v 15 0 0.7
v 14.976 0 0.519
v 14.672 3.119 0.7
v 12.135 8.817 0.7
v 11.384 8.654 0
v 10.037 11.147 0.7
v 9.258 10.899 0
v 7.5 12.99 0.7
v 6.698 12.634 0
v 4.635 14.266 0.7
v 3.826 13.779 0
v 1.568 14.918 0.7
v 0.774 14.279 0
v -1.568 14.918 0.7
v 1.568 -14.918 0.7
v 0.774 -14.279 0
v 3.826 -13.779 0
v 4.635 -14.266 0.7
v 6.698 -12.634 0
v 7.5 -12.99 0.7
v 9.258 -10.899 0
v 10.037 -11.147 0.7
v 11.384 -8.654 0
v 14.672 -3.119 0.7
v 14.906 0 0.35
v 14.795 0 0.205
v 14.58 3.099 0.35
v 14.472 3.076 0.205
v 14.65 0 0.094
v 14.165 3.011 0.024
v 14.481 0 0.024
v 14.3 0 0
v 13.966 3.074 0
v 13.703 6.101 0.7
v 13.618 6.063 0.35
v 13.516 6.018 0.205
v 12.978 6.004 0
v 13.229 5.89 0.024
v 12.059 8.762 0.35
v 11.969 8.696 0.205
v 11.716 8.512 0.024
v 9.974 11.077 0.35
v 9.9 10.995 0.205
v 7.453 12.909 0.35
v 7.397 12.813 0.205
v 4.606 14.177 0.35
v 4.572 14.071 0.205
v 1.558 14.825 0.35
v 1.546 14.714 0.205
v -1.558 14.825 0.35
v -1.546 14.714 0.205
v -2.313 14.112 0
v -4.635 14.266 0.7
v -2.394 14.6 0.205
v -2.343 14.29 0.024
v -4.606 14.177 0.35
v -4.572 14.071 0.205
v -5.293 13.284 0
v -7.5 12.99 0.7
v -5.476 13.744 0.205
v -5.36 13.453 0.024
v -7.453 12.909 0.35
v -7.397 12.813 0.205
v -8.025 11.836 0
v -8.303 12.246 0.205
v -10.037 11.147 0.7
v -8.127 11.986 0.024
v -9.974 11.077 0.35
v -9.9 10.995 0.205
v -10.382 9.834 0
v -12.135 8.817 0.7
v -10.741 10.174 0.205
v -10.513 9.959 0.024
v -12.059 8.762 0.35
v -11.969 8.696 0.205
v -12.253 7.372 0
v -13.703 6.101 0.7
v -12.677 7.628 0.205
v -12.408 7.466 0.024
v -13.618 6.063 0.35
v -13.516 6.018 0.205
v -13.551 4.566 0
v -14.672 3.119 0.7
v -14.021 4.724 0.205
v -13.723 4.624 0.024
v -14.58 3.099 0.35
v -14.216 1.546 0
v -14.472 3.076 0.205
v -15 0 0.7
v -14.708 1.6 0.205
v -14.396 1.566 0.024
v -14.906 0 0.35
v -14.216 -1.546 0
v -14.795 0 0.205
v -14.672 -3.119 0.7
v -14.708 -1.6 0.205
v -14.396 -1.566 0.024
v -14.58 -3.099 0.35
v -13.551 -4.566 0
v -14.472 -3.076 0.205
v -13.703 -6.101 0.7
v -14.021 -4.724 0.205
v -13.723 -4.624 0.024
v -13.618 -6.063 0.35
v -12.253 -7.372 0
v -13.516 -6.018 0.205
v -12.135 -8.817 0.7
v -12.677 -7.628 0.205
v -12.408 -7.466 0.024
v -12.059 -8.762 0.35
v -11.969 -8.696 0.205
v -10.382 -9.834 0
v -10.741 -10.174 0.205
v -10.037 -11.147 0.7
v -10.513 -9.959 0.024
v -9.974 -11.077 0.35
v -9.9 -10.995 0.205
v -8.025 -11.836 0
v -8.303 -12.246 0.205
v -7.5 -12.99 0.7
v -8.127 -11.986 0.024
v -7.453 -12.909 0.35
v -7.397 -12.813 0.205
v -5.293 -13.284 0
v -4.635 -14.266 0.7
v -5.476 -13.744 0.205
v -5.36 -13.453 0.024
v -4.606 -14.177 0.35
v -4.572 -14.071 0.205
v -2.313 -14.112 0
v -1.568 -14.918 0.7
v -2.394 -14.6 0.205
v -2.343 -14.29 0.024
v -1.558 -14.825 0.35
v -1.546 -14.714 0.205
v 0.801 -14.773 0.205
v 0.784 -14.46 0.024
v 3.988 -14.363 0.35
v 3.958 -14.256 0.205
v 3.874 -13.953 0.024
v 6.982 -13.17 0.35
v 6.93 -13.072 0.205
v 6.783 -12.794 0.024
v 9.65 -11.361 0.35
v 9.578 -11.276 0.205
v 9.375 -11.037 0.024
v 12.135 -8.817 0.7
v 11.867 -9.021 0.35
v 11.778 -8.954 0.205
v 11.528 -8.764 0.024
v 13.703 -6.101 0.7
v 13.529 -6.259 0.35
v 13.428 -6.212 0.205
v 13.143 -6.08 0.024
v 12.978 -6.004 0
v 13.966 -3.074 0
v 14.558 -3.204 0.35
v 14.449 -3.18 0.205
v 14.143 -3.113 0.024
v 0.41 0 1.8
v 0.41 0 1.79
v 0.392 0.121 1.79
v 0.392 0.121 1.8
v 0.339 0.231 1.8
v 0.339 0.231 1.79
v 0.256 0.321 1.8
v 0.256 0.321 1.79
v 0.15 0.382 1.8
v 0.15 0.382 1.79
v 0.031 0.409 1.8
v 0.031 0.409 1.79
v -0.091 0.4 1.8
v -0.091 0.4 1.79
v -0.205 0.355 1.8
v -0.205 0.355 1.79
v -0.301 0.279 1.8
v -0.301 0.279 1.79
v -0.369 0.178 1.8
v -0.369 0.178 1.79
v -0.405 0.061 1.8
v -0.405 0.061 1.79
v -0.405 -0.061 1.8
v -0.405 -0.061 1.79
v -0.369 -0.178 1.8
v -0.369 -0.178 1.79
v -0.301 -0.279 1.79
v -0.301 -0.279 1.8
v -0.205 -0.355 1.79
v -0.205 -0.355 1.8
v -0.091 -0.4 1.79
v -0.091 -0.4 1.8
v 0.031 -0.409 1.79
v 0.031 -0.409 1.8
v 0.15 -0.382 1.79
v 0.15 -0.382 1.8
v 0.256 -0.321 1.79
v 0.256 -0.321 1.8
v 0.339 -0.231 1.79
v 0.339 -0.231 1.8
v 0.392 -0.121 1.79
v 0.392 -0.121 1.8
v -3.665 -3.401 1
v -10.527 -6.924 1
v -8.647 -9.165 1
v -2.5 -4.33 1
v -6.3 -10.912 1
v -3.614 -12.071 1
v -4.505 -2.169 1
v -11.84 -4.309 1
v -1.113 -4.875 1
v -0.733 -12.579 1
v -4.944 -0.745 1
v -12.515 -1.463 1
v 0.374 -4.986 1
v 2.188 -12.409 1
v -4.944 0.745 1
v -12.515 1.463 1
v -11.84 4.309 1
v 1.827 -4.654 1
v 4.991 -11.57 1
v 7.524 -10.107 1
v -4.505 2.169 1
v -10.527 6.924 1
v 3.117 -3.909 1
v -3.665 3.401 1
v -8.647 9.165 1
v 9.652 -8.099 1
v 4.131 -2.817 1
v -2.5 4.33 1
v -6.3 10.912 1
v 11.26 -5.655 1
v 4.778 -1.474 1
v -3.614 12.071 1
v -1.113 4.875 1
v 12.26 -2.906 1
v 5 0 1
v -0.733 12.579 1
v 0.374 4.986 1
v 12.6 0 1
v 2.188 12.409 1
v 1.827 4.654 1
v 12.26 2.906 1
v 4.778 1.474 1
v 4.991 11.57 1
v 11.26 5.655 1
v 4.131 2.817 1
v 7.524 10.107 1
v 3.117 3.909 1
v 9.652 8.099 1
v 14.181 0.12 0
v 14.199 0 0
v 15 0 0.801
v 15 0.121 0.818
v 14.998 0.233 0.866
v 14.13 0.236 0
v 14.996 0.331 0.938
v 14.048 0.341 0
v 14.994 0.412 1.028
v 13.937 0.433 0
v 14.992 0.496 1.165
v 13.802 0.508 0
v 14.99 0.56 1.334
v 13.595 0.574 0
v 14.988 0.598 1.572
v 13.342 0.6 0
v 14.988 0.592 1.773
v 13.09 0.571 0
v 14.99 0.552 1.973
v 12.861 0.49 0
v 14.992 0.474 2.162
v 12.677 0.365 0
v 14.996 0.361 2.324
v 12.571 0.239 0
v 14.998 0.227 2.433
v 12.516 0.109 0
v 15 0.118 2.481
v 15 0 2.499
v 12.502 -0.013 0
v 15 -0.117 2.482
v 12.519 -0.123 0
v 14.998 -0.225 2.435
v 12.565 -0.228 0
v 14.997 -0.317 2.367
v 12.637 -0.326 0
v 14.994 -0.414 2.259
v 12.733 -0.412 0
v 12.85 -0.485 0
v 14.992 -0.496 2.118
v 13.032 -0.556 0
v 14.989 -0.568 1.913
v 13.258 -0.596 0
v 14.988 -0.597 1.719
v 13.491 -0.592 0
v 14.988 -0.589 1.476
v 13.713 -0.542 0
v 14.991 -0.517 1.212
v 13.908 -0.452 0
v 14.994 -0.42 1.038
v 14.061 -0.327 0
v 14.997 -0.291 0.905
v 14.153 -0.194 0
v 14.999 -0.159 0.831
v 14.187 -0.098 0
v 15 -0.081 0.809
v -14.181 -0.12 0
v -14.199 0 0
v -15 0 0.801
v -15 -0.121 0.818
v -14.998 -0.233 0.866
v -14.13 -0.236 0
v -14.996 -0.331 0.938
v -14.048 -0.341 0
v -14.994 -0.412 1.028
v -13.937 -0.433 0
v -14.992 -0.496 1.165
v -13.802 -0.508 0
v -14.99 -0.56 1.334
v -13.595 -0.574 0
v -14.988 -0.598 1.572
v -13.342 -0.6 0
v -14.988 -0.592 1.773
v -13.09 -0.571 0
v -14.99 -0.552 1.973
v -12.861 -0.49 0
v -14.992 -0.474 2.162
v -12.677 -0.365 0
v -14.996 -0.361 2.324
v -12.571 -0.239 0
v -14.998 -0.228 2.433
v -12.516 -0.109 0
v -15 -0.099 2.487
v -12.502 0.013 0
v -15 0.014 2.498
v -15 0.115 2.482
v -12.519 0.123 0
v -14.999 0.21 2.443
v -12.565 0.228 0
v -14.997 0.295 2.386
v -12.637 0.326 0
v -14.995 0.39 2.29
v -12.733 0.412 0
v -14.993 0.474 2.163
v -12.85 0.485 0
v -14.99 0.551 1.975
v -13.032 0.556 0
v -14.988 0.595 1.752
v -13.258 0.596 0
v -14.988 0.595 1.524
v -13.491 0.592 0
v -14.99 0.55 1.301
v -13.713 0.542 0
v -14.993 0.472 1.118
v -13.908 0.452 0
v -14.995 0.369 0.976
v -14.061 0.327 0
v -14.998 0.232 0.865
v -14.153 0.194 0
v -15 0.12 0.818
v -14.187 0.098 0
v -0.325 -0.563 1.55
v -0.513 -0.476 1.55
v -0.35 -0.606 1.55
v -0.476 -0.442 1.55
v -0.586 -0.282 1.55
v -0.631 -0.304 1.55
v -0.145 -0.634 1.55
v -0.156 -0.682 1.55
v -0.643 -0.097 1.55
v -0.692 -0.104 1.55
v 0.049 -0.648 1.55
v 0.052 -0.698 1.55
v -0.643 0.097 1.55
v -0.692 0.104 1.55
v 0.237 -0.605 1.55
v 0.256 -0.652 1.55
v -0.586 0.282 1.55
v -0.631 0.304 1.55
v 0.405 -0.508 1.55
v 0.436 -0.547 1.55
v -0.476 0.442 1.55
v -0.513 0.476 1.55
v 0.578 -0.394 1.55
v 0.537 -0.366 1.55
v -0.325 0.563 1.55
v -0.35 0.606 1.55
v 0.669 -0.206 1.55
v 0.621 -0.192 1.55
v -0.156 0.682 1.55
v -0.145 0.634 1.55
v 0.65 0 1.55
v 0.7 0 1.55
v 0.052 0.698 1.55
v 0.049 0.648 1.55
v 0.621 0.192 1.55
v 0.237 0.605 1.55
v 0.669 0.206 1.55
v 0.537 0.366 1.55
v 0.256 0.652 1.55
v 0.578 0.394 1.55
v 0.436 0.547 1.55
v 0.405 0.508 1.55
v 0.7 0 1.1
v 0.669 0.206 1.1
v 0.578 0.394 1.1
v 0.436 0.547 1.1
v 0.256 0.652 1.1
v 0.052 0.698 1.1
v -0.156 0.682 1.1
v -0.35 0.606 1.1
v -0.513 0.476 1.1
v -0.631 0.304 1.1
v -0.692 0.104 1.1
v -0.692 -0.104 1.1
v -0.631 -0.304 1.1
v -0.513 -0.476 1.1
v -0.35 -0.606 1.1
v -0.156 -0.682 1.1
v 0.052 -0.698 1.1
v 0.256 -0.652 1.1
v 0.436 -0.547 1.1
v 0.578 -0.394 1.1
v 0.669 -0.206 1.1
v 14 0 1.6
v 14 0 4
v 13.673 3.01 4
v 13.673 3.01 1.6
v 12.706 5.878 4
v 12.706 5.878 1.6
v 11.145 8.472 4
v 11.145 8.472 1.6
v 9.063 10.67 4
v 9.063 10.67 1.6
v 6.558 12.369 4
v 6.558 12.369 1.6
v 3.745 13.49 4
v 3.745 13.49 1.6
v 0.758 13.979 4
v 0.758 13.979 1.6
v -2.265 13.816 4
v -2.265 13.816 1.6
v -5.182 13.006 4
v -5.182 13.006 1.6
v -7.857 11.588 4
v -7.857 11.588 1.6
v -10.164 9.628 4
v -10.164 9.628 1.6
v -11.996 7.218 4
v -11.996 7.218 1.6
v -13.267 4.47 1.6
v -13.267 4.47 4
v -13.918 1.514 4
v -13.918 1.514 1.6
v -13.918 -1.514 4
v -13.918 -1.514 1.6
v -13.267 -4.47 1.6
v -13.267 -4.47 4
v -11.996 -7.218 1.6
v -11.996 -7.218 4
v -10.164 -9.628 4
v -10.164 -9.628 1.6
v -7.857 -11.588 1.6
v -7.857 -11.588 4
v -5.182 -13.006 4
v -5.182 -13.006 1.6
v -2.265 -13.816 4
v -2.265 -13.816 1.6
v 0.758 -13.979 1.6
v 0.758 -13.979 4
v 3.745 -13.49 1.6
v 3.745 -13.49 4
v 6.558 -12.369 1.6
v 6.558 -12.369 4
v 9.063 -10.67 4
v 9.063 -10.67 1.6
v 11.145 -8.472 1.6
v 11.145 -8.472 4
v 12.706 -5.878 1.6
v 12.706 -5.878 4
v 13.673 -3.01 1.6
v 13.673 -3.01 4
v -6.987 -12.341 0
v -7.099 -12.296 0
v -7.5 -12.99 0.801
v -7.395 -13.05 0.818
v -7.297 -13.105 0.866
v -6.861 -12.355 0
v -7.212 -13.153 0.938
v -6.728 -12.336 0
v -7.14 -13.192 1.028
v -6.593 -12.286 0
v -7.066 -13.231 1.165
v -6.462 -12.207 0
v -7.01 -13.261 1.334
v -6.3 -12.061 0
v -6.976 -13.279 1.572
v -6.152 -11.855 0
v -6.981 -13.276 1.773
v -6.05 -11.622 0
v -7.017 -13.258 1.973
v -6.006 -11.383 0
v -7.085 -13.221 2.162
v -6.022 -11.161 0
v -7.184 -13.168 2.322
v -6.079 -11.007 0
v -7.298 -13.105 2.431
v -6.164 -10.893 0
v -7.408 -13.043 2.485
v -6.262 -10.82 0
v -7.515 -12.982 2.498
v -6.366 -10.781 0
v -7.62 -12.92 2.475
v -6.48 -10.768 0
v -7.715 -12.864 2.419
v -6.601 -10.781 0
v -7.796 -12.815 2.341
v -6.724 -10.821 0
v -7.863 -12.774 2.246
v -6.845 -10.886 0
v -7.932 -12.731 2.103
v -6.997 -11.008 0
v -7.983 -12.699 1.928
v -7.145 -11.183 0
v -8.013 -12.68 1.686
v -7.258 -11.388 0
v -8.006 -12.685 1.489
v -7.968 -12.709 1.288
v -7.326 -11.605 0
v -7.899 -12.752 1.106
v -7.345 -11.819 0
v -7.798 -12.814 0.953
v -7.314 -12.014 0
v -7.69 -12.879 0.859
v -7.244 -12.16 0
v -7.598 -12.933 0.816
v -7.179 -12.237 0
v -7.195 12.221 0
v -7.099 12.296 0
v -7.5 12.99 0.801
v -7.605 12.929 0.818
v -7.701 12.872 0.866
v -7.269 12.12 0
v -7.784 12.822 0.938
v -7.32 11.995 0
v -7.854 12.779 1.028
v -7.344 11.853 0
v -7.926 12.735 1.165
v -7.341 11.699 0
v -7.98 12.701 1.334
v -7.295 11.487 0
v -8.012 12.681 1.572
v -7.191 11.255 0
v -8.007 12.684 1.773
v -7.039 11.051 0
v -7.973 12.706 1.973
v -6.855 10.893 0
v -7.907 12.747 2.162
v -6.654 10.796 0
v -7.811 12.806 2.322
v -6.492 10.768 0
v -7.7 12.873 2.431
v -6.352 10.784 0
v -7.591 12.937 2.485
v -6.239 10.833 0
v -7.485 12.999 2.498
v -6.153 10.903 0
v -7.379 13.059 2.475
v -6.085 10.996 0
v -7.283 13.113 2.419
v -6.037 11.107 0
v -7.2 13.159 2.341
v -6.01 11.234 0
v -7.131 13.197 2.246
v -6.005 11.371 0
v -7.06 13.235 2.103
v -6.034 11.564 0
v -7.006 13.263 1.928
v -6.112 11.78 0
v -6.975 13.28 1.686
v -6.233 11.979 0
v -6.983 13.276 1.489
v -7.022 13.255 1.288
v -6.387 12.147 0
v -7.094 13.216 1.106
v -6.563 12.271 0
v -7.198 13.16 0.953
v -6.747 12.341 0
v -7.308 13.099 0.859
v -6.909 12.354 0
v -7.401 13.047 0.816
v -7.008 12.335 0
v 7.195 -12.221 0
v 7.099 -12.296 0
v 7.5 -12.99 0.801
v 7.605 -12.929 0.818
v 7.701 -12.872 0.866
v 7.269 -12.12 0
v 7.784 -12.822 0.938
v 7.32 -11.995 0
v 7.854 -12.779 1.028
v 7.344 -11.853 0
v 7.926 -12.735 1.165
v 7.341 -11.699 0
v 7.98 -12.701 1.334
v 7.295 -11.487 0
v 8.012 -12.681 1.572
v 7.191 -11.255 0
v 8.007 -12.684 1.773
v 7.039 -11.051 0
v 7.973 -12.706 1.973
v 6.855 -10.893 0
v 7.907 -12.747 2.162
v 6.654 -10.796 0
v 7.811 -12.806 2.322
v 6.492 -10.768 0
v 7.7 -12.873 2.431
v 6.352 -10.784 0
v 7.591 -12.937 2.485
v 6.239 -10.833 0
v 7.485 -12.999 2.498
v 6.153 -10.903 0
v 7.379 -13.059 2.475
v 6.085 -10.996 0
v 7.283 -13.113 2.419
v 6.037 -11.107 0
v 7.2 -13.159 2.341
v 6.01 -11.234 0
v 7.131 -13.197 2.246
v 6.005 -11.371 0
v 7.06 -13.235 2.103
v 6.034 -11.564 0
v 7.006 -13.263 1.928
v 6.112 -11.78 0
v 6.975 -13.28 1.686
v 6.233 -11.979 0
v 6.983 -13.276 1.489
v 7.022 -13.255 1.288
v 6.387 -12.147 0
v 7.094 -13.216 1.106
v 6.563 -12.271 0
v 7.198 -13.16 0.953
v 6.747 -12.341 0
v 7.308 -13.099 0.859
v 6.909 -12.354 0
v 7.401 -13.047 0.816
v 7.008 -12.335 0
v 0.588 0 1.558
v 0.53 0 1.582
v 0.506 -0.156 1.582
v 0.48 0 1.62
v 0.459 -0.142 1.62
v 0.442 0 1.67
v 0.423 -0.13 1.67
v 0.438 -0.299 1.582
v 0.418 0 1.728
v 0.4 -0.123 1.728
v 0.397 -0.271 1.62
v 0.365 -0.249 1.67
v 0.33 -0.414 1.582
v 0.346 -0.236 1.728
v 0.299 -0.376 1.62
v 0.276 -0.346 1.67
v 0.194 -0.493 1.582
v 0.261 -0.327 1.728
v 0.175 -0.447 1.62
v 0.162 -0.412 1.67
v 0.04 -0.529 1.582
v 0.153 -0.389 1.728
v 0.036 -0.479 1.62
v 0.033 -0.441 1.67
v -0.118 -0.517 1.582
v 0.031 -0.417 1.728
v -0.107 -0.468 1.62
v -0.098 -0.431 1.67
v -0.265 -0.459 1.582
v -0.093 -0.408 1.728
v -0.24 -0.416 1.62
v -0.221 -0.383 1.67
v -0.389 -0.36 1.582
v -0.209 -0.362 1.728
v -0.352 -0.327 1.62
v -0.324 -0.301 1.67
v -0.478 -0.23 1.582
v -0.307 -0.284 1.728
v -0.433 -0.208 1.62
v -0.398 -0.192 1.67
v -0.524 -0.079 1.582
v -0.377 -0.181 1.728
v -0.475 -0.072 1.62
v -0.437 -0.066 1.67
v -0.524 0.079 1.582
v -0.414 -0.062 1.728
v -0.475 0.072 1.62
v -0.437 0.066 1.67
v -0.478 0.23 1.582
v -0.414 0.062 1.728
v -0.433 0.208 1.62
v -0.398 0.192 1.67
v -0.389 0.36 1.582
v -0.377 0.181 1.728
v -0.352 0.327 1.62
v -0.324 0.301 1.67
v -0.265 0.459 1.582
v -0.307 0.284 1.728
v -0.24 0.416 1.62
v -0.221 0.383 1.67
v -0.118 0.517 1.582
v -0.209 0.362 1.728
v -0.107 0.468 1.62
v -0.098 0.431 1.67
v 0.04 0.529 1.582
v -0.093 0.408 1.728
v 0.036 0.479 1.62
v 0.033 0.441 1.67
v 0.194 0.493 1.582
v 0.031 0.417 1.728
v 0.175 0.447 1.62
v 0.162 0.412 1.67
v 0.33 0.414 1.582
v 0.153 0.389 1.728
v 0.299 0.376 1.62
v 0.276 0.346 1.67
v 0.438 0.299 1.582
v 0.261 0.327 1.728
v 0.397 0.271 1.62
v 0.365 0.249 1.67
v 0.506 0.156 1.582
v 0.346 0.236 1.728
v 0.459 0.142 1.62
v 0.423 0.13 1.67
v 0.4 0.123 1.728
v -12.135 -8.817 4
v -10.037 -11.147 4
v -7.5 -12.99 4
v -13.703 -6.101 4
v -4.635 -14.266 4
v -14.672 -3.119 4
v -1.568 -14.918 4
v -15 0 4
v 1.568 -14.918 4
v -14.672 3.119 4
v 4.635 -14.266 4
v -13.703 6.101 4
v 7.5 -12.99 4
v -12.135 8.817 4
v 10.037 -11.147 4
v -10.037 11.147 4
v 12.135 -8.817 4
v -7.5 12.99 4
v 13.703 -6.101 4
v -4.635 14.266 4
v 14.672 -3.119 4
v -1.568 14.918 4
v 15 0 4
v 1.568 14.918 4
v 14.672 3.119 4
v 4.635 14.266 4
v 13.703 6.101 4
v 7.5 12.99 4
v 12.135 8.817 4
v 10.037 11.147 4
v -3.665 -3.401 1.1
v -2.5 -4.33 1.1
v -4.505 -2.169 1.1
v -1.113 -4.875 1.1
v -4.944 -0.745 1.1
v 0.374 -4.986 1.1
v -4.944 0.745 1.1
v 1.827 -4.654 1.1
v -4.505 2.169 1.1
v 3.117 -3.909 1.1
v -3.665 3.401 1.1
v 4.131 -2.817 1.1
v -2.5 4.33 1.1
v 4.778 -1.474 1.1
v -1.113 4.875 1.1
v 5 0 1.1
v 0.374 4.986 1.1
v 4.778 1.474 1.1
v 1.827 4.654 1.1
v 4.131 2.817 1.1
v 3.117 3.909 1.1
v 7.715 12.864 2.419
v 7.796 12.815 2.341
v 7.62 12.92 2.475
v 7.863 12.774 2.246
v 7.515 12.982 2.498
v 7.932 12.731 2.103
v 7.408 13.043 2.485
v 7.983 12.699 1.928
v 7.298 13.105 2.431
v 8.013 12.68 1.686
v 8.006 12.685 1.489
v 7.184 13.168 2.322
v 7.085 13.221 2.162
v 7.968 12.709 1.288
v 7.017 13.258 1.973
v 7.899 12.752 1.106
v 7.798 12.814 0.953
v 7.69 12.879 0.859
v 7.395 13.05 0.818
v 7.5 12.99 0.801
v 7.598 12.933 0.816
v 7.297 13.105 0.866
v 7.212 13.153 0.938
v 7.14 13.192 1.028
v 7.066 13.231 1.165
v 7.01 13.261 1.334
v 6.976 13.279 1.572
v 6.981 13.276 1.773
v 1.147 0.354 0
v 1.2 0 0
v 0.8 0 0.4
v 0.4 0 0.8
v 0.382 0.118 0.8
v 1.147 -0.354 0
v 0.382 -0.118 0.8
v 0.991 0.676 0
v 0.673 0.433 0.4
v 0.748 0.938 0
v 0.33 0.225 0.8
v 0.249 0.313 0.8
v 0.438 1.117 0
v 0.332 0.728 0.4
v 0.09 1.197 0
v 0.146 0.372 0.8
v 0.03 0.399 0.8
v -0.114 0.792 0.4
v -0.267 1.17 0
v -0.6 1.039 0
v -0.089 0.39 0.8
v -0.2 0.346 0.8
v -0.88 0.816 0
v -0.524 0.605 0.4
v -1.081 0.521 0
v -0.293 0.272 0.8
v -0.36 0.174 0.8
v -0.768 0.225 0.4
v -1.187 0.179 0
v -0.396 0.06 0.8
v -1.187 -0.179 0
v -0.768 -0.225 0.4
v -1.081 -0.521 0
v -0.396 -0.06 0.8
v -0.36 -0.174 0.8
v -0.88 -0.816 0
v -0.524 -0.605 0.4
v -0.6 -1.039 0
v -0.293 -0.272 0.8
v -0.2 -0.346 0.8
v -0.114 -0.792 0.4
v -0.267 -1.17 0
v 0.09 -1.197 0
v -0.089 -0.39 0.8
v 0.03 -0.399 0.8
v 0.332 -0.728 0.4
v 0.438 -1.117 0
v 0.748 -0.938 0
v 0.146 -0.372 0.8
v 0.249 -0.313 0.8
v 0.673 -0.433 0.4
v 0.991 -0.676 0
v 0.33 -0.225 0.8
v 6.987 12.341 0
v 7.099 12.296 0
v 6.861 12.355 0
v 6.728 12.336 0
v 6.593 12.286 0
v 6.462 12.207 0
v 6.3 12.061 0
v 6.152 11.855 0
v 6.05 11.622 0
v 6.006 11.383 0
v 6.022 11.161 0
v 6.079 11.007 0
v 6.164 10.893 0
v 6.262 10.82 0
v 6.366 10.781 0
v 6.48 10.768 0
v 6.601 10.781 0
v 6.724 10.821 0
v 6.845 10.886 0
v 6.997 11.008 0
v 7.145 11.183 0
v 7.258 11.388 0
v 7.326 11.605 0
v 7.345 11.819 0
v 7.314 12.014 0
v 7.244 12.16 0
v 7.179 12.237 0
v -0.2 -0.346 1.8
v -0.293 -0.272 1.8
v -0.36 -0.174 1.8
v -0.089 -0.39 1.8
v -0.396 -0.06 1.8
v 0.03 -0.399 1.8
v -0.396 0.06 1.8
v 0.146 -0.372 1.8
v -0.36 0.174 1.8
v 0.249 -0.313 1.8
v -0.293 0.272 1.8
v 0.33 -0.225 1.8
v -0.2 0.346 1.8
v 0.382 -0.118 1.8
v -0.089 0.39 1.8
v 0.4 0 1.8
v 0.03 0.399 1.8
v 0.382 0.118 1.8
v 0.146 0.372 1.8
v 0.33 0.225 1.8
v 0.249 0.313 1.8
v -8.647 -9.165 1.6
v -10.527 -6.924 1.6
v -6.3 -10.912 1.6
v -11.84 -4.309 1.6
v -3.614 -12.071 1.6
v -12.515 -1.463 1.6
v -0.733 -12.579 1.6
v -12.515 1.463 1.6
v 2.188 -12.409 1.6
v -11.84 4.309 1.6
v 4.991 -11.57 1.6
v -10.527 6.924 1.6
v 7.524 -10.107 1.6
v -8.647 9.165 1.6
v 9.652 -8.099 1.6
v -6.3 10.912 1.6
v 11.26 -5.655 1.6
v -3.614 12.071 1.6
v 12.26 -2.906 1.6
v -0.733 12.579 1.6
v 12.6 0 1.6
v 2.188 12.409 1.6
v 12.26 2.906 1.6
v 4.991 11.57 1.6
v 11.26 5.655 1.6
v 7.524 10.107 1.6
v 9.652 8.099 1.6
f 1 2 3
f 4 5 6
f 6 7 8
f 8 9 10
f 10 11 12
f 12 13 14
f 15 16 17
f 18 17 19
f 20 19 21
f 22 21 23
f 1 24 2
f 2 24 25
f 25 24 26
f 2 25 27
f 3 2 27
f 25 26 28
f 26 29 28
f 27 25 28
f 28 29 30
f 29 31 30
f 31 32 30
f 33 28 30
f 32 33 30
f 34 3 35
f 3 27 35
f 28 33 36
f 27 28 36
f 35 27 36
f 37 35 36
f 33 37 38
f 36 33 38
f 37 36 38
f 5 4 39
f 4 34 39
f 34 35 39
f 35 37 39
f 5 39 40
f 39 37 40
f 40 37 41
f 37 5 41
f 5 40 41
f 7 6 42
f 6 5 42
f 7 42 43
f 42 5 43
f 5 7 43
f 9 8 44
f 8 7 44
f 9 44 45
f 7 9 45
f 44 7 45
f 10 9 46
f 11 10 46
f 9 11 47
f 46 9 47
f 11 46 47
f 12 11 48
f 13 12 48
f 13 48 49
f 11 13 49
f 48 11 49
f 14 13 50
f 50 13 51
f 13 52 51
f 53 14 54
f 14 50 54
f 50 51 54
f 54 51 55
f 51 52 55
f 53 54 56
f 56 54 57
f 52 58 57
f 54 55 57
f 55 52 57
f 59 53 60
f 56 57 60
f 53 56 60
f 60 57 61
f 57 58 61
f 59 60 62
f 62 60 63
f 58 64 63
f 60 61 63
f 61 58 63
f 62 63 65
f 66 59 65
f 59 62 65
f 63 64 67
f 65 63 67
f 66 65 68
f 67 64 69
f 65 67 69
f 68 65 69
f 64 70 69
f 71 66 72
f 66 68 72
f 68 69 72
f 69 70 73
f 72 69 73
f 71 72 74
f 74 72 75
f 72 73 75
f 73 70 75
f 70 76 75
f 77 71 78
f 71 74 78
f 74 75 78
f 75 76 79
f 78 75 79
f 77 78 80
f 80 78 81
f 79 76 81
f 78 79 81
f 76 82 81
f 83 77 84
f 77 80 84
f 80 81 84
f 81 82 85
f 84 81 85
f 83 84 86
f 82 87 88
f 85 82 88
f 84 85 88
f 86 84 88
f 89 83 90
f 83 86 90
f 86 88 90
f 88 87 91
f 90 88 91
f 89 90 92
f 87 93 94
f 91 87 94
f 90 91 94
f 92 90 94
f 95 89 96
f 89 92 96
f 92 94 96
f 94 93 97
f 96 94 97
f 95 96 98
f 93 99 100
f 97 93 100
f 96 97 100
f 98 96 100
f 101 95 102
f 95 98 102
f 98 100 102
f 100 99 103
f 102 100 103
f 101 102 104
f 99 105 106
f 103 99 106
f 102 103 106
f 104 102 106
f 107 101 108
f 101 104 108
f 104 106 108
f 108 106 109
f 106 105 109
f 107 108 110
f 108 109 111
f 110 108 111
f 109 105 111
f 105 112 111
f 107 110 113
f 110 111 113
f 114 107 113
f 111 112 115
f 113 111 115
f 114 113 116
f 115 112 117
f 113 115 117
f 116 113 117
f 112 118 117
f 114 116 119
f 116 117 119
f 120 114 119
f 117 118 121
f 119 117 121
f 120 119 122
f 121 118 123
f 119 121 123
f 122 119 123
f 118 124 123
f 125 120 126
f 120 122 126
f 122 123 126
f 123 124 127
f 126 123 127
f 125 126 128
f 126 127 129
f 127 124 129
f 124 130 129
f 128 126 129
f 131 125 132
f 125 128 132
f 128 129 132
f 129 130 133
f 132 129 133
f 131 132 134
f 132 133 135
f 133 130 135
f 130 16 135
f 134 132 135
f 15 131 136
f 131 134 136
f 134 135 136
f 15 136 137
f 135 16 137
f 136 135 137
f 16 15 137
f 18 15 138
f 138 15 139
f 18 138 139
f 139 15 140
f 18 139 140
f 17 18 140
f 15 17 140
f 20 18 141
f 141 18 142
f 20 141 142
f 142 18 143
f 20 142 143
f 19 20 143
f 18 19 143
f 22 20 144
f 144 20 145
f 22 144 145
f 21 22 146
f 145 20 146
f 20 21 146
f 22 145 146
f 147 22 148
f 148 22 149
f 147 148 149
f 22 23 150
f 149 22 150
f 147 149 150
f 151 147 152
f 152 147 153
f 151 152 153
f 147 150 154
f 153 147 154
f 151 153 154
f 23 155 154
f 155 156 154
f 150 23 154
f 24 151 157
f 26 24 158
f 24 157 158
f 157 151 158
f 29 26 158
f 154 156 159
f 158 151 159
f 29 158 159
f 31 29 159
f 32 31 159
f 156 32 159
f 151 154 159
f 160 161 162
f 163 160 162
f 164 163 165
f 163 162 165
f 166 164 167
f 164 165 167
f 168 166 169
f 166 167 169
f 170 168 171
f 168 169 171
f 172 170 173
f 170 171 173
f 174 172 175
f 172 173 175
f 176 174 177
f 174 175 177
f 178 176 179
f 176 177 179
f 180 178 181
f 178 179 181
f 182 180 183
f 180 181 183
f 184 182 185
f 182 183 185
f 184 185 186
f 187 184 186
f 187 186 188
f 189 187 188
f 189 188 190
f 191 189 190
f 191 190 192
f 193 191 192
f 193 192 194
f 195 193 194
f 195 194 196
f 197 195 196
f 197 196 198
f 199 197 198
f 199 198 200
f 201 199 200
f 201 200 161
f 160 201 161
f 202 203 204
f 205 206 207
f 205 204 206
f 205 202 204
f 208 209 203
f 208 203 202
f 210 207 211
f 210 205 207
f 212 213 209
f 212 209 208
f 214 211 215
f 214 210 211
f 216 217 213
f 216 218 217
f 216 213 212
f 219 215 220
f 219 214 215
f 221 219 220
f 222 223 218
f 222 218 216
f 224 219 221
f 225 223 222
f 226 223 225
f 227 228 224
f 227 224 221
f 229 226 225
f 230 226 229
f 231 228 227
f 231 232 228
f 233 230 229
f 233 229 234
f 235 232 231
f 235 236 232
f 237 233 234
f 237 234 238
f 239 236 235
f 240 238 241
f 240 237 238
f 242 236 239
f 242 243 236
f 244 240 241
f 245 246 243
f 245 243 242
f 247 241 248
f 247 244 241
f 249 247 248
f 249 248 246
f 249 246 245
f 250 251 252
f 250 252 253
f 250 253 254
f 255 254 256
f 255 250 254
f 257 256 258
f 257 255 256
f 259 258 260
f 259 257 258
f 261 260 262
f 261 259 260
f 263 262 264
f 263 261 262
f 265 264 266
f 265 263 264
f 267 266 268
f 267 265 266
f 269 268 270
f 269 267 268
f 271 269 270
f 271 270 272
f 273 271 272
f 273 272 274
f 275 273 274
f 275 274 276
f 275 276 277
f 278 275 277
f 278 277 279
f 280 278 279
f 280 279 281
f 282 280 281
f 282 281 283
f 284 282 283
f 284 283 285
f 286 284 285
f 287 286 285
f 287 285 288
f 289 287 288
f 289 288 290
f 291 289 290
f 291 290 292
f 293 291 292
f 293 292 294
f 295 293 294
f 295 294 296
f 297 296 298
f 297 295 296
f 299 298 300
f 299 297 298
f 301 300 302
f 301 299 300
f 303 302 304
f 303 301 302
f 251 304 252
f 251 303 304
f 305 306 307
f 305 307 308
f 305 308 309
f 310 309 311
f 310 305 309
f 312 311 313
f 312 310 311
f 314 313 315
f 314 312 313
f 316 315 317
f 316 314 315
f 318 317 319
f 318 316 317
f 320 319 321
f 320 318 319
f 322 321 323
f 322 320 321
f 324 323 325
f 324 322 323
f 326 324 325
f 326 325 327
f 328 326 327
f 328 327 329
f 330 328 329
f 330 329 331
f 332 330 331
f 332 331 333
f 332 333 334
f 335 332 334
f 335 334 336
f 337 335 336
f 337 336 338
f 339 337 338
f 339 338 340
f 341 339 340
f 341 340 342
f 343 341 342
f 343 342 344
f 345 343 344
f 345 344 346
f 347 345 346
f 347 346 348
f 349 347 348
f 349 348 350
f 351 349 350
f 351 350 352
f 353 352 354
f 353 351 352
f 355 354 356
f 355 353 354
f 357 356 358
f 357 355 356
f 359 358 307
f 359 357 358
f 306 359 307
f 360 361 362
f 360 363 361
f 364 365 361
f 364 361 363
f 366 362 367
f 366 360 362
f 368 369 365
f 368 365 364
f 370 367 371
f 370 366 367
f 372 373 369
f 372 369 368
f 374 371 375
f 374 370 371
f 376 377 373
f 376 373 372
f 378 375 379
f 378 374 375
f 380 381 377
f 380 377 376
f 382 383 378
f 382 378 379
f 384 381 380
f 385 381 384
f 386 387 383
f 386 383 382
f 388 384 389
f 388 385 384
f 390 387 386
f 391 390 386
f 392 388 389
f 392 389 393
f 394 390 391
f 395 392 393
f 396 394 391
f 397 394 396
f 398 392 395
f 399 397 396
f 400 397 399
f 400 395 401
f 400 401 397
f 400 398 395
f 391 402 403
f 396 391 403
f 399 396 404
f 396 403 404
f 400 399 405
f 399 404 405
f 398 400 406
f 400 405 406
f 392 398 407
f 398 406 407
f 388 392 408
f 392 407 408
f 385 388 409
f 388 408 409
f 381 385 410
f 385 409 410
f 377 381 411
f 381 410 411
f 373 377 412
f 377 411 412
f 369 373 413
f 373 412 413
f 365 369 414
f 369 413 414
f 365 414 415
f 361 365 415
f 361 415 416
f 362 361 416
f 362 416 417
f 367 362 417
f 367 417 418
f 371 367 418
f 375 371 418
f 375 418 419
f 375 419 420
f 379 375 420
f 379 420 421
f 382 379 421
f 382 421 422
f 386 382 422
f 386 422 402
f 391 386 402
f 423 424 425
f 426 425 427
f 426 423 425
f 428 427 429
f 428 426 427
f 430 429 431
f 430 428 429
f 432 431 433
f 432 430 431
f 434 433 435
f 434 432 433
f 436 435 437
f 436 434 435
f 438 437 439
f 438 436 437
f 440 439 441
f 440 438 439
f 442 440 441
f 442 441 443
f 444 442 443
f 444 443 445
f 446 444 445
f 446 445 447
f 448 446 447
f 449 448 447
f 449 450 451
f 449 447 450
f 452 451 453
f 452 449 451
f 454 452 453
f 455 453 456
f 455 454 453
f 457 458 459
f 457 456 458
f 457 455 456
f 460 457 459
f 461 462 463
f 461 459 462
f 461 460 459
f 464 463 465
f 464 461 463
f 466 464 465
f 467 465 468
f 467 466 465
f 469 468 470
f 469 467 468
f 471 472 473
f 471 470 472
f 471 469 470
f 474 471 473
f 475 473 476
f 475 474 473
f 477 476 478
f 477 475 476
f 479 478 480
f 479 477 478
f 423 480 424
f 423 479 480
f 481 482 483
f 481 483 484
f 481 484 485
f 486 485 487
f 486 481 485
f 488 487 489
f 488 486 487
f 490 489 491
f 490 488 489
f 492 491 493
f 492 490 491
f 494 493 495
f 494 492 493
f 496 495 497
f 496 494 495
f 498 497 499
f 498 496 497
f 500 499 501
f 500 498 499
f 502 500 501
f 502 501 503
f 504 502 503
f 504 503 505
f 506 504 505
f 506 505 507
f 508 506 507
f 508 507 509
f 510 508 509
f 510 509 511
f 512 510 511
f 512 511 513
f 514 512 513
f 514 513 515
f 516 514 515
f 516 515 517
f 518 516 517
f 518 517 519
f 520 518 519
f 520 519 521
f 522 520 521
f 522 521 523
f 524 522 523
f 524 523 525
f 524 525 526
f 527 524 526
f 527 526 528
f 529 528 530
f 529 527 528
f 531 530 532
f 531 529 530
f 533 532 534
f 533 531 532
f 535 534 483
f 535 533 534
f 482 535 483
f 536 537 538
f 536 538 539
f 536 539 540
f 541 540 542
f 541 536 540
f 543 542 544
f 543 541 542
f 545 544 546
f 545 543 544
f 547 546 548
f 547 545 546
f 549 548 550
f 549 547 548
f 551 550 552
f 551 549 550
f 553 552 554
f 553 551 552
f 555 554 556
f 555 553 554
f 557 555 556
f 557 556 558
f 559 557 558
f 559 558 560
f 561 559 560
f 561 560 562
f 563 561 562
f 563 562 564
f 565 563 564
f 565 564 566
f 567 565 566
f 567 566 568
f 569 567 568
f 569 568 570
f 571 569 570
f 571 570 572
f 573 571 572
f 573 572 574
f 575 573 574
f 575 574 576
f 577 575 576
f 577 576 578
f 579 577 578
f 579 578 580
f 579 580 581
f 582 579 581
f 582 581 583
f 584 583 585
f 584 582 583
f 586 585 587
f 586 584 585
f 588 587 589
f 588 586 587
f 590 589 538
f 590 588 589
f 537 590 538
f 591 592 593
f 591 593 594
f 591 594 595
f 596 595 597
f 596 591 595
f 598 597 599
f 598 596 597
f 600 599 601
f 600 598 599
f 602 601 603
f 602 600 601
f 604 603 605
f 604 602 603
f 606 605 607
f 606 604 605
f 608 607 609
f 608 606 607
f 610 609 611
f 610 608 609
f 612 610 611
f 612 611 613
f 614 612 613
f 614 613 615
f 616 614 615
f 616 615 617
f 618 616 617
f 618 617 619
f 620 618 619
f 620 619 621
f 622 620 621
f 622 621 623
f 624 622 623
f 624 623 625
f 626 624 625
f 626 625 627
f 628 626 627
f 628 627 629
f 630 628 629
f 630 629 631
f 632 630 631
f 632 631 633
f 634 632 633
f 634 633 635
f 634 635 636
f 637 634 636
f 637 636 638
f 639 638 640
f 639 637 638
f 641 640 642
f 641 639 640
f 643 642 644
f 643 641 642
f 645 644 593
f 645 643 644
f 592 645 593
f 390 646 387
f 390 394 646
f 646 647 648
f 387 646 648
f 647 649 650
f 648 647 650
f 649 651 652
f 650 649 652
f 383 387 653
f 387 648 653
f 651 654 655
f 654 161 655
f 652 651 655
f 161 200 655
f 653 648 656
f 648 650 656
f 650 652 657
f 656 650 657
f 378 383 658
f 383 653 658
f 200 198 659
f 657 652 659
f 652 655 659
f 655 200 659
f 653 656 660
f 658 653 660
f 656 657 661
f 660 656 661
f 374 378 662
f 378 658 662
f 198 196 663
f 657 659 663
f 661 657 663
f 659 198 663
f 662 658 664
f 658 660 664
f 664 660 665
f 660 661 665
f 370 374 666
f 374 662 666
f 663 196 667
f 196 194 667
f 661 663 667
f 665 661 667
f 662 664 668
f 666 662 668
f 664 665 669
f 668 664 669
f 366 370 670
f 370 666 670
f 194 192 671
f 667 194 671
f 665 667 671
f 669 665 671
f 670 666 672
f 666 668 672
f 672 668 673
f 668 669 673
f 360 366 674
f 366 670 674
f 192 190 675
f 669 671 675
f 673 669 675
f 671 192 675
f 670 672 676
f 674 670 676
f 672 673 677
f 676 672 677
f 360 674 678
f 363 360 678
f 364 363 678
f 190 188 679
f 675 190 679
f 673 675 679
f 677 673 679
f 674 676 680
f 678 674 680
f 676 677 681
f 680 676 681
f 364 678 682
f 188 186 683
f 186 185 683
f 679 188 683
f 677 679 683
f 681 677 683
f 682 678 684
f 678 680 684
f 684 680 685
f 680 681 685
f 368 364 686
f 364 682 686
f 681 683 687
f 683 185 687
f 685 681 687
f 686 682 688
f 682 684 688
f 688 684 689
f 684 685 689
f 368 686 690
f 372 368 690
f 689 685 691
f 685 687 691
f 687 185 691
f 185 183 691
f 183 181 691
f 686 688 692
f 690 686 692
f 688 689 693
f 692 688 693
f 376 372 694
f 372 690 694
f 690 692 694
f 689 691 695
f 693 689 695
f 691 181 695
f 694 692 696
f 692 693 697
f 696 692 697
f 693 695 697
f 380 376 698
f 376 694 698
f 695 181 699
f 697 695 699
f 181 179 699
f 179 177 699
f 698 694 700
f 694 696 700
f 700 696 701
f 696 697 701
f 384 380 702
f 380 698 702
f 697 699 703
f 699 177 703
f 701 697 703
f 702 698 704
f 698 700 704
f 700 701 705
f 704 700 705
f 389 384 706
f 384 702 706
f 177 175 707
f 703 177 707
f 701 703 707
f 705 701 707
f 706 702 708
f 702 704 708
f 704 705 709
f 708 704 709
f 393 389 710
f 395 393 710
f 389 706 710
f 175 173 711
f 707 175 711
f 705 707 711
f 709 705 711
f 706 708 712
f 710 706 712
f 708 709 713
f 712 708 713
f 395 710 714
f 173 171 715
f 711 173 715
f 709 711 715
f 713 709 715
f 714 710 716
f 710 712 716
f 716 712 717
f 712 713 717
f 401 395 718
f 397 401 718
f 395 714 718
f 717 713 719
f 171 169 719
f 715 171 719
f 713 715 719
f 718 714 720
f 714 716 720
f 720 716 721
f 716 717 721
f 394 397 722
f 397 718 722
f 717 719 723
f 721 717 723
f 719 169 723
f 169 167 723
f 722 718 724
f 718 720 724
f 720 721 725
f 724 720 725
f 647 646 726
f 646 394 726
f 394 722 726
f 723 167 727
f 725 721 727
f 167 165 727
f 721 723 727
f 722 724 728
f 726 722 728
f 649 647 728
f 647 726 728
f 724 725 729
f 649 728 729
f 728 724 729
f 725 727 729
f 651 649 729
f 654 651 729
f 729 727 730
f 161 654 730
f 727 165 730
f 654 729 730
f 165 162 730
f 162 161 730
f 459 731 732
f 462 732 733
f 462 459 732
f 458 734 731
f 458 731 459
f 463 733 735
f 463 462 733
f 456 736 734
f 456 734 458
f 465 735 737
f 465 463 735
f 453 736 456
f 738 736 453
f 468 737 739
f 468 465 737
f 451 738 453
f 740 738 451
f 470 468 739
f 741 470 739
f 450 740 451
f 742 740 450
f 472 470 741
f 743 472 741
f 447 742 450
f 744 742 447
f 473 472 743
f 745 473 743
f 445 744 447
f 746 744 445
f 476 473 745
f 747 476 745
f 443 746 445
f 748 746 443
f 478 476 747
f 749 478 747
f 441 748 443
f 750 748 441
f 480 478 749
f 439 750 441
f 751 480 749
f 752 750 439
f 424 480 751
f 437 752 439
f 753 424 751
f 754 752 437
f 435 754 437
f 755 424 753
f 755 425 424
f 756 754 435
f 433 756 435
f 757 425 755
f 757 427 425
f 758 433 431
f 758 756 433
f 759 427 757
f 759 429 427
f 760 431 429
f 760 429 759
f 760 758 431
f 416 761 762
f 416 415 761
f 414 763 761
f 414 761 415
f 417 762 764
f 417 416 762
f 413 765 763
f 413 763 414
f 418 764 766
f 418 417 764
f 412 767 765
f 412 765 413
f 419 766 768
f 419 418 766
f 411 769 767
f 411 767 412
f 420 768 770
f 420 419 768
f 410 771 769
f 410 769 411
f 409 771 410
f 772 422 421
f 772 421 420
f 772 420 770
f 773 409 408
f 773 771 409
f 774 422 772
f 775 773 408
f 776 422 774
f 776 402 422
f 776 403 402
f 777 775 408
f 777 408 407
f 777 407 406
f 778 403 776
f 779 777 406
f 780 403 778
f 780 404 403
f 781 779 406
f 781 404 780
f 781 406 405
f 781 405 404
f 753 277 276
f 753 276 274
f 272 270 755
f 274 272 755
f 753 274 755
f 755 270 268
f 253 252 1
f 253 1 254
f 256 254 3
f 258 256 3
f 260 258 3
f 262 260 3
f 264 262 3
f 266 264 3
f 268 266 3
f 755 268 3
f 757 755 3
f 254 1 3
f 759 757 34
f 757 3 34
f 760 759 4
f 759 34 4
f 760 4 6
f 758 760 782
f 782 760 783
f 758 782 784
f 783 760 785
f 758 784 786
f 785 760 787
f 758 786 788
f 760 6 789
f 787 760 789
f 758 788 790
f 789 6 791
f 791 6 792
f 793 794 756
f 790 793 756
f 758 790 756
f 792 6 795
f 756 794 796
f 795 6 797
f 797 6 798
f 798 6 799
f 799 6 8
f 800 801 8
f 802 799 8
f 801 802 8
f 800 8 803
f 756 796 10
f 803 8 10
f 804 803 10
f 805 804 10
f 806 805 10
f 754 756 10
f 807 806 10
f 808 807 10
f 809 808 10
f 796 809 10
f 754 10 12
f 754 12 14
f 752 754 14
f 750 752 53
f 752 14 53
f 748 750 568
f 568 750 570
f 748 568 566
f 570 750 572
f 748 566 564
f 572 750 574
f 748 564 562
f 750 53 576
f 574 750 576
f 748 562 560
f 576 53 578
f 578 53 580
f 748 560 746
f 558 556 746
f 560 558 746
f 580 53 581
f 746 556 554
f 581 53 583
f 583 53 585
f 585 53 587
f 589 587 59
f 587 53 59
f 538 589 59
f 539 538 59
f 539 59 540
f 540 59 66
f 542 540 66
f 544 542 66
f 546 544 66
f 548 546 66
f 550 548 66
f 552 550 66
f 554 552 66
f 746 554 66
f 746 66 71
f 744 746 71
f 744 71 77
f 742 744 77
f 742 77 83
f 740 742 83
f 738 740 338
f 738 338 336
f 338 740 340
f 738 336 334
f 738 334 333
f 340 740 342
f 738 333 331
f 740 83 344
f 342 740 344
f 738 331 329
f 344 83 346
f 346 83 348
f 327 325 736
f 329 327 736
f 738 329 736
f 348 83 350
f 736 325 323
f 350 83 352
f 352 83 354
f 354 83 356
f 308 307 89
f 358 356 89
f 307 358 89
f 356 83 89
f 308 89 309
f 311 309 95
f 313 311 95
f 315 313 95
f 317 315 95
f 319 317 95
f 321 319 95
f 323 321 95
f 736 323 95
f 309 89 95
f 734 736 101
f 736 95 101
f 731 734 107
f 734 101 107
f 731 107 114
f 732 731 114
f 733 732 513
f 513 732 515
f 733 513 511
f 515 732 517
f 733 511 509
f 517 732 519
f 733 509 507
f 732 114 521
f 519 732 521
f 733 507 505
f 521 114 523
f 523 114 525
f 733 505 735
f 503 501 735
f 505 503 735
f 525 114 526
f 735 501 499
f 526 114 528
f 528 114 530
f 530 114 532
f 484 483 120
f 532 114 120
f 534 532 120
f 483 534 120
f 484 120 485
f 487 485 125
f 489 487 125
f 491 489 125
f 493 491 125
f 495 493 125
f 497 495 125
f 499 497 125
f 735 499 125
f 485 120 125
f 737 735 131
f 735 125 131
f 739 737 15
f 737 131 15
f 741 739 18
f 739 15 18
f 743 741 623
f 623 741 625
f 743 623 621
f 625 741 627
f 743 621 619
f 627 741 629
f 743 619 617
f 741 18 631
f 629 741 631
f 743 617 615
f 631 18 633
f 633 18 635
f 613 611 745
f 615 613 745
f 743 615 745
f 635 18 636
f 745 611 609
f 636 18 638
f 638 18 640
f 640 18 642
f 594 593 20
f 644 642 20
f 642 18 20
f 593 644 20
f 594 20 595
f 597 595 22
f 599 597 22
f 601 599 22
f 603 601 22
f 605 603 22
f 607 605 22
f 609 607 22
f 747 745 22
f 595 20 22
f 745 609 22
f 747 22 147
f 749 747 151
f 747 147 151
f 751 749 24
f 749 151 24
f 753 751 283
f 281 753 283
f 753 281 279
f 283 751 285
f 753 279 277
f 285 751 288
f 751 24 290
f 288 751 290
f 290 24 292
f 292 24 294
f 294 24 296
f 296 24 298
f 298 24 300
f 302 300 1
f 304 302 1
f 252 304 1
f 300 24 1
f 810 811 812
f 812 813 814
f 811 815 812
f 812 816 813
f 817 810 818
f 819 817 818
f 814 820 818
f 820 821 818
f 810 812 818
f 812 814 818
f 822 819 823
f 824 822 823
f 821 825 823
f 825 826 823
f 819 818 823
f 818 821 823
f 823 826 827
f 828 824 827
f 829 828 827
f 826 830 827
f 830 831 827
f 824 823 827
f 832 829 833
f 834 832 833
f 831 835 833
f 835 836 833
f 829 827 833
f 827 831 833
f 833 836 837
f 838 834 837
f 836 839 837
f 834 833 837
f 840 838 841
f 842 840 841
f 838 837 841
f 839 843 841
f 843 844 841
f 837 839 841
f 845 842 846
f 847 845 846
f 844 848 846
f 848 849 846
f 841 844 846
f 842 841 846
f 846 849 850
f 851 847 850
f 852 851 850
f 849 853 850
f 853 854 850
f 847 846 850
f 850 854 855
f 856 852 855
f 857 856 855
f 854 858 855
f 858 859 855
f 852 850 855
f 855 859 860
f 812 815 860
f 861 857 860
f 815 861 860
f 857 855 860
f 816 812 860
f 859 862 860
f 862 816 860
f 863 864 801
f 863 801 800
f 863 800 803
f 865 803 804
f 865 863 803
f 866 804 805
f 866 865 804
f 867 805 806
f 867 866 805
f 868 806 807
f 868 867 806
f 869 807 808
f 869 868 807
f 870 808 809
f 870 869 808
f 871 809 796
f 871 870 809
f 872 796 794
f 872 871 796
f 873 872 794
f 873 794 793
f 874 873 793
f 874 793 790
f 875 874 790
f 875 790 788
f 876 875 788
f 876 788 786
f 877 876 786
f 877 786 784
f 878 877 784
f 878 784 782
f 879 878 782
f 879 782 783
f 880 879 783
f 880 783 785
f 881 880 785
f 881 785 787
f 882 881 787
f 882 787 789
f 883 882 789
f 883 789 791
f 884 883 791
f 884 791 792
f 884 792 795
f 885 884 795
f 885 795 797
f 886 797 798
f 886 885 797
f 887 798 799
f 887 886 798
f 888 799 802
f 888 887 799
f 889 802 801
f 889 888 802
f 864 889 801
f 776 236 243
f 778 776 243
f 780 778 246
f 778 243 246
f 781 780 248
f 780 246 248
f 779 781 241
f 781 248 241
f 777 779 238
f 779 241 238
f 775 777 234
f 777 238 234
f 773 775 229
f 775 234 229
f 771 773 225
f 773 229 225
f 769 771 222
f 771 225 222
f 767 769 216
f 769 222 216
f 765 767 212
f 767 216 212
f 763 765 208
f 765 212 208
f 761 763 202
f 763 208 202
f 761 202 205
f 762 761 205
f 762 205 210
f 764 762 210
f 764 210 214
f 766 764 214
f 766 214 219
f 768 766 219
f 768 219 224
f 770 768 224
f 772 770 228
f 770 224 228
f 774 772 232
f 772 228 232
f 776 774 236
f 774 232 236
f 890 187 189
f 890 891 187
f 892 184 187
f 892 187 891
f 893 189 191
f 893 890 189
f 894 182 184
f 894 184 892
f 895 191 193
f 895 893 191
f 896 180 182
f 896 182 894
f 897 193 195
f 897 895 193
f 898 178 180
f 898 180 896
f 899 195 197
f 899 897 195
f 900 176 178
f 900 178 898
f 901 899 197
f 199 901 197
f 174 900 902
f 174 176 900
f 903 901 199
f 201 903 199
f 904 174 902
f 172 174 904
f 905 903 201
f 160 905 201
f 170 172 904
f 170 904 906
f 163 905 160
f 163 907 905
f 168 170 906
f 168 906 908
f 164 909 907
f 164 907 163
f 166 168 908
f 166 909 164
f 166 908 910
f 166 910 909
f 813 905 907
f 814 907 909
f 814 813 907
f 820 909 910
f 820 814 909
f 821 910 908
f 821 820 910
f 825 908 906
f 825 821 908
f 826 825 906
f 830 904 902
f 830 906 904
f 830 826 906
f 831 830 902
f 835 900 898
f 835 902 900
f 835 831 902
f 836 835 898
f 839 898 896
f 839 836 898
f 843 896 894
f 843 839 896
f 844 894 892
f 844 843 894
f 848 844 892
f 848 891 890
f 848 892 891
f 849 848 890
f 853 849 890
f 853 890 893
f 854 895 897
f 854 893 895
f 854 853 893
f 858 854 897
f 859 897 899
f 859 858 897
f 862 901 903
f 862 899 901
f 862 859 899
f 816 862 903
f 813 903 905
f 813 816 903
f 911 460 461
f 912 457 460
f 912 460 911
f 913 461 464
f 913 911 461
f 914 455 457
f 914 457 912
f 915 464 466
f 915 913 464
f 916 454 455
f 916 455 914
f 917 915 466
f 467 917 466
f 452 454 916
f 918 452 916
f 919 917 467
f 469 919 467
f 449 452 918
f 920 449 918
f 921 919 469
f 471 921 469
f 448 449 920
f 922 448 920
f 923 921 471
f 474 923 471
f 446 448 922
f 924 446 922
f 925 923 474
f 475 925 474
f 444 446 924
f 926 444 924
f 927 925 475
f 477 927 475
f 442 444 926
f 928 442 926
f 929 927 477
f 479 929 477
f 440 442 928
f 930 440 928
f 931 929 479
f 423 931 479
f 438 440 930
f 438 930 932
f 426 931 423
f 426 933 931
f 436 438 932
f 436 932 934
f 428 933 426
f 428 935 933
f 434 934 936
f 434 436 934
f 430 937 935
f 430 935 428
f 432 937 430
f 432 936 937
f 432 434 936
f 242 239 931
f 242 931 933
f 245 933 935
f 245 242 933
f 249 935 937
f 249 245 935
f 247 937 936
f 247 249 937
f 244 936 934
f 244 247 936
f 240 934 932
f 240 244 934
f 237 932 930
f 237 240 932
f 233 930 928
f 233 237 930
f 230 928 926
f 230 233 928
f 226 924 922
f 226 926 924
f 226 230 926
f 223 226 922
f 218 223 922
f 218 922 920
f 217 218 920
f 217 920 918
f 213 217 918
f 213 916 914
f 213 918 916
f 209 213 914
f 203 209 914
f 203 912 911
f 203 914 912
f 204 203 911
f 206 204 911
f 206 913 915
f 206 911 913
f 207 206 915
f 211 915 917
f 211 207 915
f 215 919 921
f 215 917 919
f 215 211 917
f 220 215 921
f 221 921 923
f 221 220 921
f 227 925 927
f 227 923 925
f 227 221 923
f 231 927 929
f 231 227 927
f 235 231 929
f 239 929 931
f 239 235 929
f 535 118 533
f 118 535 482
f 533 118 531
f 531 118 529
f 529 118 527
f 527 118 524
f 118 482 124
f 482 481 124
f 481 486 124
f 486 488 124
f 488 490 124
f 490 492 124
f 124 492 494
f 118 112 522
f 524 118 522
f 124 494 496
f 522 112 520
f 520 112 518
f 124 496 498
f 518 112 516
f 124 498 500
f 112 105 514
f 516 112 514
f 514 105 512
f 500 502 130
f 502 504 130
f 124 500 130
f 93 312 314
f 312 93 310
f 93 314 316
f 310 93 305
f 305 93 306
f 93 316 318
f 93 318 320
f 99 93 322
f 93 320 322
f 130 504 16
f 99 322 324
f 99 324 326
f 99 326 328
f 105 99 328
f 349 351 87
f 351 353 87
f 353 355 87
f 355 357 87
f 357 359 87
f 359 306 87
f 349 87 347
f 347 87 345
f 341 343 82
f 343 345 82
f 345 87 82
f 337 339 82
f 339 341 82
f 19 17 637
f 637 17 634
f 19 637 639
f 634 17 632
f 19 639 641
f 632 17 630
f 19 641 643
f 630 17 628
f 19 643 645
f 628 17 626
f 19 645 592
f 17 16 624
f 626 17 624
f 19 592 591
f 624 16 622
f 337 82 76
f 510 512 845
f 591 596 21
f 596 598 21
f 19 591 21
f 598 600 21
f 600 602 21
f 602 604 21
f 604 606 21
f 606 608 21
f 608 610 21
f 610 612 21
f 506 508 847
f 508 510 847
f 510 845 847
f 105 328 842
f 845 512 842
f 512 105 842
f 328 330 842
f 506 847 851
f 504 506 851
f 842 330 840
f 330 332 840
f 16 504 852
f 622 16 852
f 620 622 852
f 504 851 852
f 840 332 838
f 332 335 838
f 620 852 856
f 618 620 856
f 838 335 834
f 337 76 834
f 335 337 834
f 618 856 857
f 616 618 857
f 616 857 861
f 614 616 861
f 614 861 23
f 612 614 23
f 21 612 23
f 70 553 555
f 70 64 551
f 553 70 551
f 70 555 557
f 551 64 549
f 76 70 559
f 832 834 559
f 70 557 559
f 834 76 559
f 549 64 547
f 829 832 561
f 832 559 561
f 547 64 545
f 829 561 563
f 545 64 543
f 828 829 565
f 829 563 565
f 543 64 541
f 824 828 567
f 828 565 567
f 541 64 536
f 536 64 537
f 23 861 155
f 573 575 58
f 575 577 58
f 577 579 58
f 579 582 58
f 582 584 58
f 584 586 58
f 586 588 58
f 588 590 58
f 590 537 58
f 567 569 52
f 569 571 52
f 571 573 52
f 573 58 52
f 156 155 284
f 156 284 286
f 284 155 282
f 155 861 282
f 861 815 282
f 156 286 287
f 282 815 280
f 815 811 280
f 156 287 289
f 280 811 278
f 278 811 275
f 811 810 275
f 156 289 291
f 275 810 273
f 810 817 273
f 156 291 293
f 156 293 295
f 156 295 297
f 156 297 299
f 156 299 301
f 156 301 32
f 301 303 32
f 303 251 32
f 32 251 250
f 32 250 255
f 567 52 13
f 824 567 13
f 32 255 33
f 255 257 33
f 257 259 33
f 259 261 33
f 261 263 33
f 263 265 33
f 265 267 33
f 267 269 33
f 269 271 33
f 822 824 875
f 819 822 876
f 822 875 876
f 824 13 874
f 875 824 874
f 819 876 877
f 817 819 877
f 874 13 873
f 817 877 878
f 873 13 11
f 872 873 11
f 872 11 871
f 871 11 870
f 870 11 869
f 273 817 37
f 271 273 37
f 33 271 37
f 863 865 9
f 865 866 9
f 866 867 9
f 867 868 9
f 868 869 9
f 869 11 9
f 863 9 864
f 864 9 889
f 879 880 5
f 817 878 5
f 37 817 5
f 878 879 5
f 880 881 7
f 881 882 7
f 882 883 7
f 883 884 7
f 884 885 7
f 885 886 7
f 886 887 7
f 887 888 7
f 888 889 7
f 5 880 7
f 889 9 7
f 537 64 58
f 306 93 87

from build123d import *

# Parameters (mm, degrees)
CYLINDER018_R               = 0.6
CYLINDER018_DEPTH           = 30
CYLINDER018_PLACEMENT_ANGLE = 45
ARRAY_COUNT                 = 6
CYLINDER014_R               = 0.4
CYLINDER014_DEPTH           = 2
CYLINDER012_R               = 0.41
CYLINDER012_DEPTH           = 0.8
CYLINDER013_R               = 0.7
CYLINDER013_DEPTH           = 0.55
FILLET003_R                 = 0.24
CYLINDER015_R               = 5
CYLINDER015_DEPTH           = 0.1
CYLINDER008_R               = 16
CYLINDER008_DEPTH           = 10
CYLINDER007_R               = 14
CYLINDER007_DEPTH           = 6.4
CYLINDER006_R               = 14
CYLINDER006_DEPTH           = 1
CYLINDER005_R               = 0.4
CYLINDER005_DEPTH           = 1
CYLINDER001_R               = 12.6
CYLINDER001_DEPTH           = 8
CYLINDER_R                  = 15
CYLINDER_DEPTH              = 8
CYLINDER002_R               = 15
CYLINDER002_DEPTH           = 1
FILLET_R                    = 0.7
FILLET001_R                 = 0.7
CHAMFER_SIZE                = 0.8


with BuildPart() as array:
    # Cylinder018 → Cylinder018 (new body)
    with BuildSketch(Plane.XY):
        Circle(CYLINDER018_R)
    extrude(amount=CYLINDER018_DEPTH)


with BuildPart() as array_1:
    # Cylinder018 placement: moved
    add(array.part.moved(Location((0, 0, -4.5))).rotate(Axis((0, 0, -4.5), (0, 1, 0)), CYLINDER018_PLACEMENT_ANGLE))

    # Array: Array ×6 about axis
    array_axis = Axis((0, 0, 0), (0, 0, 1))


with BuildPart() as array_2:
    add(array_1.part)
    for i in range(1, ARRAY_COUNT):
        add(array_1.part.rotate(array_axis, i * 360 / ARRAY_COUNT))


with BuildPart() as array_3:
    # Array placement: moved
    add(array_2.part.moved(Location((0, 0, -8.85))))


with BuildPart() as cylinder014:
    # Cylinder014 → Cylinder014 (new body)
    with BuildSketch(Plane.XY.offset(1)):
        Circle(CYLINDER014_R)
    extrude(amount=CYLINDER014_DEPTH)


with BuildPart() as cylinder012:
    # Cylinder012 → Cylinder012 (new body)
    with BuildSketch(Plane.XY.offset(1)):
        Circle(CYLINDER012_R)
    extrude(amount=CYLINDER012_DEPTH)


with BuildPart() as fillet003:
    # Cylinder013 → Cylinder013 (new body)
    with BuildSketch(Plane.XY.offset(1)):
        Circle(CYLINDER013_R)
    extrude(amount=CYLINDER013_DEPTH)

    # Fusion001: union Cylinder012
    add(cylinder012.part)

    # Fillet003
    fillet003_edges = [fillet003.edges().sort_by_distance(p)[0] for p in [
        (-0.41, 0, 1.55),
    ]]
    fillet(fillet003_edges, radius=FILLET003_R)


with BuildPart() as cut006:
    # Cylinder015 → Cylinder015 (new body)
    with BuildSketch(Plane.XY.offset(1)):
        Circle(CYLINDER015_R)
    extrude(amount=CYLINDER015_DEPTH)

    # Fusion002: union Fillet003
    add(fillet003.part)

    # Cut006: cut Cylinder014
    add(cylinder014.part, mode=Mode.SUBTRACT)


with BuildPart() as cylinder008:
    # Cylinder008 → Cylinder008 (new body)
    with BuildSketch(Plane.XY.offset(4)):
        Circle(CYLINDER008_R)
    extrude(amount=CYLINDER008_DEPTH)


with BuildPart() as cylinder007:
    # Cylinder007 → Cylinder007 (new body)
    with BuildSketch(Plane.XY.offset(1.6)):
        Circle(CYLINDER007_R)
    extrude(amount=CYLINDER007_DEPTH)


with BuildPart() as cylinder006:
    # Cylinder006 → Cylinder006 (new body)
    with BuildSketch(Plane.XY.offset(7)):
        Circle(CYLINDER006_R)
    extrude(amount=CYLINDER006_DEPTH)


with BuildPart() as cylinder005:
    # Cylinder005 → Cylinder005 (new body)
    with BuildSketch(Plane.XY):
        Circle(CYLINDER005_R)
    extrude(amount=CYLINDER005_DEPTH)


with BuildPart() as cylinder001:
    # Cylinder001 → Cylinder001 (new body)
    with BuildSketch(Plane.XY):
        Circle(CYLINDER001_R)
    extrude(amount=CYLINDER001_DEPTH)


with BuildPart() as cut:
    # Cylinder → Cylinder (new body)
    with BuildSketch(Plane.XY):
        Circle(CYLINDER_R)
    extrude(amount=CYLINDER_DEPTH)

    # Cut: cut Cylinder001
    add(cylinder001.part, mode=Mode.SUBTRACT)


with BuildPart() as cut009:
    # Cylinder002 → Cylinder002 (new body)
    with BuildSketch(Plane.XY):
        Circle(CYLINDER002_R)
    extrude(amount=CYLINDER002_DEPTH)

    # Fusion: union Cut
    add(cut.part)

    # Cut001: cut Cylinder005
    add(cylinder005.part, mode=Mode.SUBTRACT)

    # Cut003: cut Cylinder006
    add(cylinder006.part, mode=Mode.SUBTRACT)

    # Fillet
    fillet_edges = [cut009.edges().sort_by_distance(p)[0] for p in [
        (-15, 0, 8),
    ]]
    fillet(fillet_edges, radius=FILLET_R)

    # Fillet001
    fillet001_edges = [cut009.edges().sort_by_distance(p)[0] for p in [
        (-15, 0, 0),
    ]]
    fillet(fillet001_edges, radius=FILLET001_R)

    # Chamfer
    chamfer_edges = [cut009.edges().sort_by_distance(p)[0] for p in [
        (-0.4, 0, 0),
    ]]
    chamfer(chamfer_edges, length=CHAMFER_SIZE)

    # Cut007: cut Cylinder007
    add(cylinder007.part, mode=Mode.SUBTRACT)

    # Cut008: cut Cylinder008
    add(cylinder008.part, mode=Mode.SUBTRACT)

    # Fusion003: union Cut006
    add(cut006.part)

    # Cut009: cut Array
    add(array_3.part, mode=Mode.SUBTRACT)


solid = cut009.part
